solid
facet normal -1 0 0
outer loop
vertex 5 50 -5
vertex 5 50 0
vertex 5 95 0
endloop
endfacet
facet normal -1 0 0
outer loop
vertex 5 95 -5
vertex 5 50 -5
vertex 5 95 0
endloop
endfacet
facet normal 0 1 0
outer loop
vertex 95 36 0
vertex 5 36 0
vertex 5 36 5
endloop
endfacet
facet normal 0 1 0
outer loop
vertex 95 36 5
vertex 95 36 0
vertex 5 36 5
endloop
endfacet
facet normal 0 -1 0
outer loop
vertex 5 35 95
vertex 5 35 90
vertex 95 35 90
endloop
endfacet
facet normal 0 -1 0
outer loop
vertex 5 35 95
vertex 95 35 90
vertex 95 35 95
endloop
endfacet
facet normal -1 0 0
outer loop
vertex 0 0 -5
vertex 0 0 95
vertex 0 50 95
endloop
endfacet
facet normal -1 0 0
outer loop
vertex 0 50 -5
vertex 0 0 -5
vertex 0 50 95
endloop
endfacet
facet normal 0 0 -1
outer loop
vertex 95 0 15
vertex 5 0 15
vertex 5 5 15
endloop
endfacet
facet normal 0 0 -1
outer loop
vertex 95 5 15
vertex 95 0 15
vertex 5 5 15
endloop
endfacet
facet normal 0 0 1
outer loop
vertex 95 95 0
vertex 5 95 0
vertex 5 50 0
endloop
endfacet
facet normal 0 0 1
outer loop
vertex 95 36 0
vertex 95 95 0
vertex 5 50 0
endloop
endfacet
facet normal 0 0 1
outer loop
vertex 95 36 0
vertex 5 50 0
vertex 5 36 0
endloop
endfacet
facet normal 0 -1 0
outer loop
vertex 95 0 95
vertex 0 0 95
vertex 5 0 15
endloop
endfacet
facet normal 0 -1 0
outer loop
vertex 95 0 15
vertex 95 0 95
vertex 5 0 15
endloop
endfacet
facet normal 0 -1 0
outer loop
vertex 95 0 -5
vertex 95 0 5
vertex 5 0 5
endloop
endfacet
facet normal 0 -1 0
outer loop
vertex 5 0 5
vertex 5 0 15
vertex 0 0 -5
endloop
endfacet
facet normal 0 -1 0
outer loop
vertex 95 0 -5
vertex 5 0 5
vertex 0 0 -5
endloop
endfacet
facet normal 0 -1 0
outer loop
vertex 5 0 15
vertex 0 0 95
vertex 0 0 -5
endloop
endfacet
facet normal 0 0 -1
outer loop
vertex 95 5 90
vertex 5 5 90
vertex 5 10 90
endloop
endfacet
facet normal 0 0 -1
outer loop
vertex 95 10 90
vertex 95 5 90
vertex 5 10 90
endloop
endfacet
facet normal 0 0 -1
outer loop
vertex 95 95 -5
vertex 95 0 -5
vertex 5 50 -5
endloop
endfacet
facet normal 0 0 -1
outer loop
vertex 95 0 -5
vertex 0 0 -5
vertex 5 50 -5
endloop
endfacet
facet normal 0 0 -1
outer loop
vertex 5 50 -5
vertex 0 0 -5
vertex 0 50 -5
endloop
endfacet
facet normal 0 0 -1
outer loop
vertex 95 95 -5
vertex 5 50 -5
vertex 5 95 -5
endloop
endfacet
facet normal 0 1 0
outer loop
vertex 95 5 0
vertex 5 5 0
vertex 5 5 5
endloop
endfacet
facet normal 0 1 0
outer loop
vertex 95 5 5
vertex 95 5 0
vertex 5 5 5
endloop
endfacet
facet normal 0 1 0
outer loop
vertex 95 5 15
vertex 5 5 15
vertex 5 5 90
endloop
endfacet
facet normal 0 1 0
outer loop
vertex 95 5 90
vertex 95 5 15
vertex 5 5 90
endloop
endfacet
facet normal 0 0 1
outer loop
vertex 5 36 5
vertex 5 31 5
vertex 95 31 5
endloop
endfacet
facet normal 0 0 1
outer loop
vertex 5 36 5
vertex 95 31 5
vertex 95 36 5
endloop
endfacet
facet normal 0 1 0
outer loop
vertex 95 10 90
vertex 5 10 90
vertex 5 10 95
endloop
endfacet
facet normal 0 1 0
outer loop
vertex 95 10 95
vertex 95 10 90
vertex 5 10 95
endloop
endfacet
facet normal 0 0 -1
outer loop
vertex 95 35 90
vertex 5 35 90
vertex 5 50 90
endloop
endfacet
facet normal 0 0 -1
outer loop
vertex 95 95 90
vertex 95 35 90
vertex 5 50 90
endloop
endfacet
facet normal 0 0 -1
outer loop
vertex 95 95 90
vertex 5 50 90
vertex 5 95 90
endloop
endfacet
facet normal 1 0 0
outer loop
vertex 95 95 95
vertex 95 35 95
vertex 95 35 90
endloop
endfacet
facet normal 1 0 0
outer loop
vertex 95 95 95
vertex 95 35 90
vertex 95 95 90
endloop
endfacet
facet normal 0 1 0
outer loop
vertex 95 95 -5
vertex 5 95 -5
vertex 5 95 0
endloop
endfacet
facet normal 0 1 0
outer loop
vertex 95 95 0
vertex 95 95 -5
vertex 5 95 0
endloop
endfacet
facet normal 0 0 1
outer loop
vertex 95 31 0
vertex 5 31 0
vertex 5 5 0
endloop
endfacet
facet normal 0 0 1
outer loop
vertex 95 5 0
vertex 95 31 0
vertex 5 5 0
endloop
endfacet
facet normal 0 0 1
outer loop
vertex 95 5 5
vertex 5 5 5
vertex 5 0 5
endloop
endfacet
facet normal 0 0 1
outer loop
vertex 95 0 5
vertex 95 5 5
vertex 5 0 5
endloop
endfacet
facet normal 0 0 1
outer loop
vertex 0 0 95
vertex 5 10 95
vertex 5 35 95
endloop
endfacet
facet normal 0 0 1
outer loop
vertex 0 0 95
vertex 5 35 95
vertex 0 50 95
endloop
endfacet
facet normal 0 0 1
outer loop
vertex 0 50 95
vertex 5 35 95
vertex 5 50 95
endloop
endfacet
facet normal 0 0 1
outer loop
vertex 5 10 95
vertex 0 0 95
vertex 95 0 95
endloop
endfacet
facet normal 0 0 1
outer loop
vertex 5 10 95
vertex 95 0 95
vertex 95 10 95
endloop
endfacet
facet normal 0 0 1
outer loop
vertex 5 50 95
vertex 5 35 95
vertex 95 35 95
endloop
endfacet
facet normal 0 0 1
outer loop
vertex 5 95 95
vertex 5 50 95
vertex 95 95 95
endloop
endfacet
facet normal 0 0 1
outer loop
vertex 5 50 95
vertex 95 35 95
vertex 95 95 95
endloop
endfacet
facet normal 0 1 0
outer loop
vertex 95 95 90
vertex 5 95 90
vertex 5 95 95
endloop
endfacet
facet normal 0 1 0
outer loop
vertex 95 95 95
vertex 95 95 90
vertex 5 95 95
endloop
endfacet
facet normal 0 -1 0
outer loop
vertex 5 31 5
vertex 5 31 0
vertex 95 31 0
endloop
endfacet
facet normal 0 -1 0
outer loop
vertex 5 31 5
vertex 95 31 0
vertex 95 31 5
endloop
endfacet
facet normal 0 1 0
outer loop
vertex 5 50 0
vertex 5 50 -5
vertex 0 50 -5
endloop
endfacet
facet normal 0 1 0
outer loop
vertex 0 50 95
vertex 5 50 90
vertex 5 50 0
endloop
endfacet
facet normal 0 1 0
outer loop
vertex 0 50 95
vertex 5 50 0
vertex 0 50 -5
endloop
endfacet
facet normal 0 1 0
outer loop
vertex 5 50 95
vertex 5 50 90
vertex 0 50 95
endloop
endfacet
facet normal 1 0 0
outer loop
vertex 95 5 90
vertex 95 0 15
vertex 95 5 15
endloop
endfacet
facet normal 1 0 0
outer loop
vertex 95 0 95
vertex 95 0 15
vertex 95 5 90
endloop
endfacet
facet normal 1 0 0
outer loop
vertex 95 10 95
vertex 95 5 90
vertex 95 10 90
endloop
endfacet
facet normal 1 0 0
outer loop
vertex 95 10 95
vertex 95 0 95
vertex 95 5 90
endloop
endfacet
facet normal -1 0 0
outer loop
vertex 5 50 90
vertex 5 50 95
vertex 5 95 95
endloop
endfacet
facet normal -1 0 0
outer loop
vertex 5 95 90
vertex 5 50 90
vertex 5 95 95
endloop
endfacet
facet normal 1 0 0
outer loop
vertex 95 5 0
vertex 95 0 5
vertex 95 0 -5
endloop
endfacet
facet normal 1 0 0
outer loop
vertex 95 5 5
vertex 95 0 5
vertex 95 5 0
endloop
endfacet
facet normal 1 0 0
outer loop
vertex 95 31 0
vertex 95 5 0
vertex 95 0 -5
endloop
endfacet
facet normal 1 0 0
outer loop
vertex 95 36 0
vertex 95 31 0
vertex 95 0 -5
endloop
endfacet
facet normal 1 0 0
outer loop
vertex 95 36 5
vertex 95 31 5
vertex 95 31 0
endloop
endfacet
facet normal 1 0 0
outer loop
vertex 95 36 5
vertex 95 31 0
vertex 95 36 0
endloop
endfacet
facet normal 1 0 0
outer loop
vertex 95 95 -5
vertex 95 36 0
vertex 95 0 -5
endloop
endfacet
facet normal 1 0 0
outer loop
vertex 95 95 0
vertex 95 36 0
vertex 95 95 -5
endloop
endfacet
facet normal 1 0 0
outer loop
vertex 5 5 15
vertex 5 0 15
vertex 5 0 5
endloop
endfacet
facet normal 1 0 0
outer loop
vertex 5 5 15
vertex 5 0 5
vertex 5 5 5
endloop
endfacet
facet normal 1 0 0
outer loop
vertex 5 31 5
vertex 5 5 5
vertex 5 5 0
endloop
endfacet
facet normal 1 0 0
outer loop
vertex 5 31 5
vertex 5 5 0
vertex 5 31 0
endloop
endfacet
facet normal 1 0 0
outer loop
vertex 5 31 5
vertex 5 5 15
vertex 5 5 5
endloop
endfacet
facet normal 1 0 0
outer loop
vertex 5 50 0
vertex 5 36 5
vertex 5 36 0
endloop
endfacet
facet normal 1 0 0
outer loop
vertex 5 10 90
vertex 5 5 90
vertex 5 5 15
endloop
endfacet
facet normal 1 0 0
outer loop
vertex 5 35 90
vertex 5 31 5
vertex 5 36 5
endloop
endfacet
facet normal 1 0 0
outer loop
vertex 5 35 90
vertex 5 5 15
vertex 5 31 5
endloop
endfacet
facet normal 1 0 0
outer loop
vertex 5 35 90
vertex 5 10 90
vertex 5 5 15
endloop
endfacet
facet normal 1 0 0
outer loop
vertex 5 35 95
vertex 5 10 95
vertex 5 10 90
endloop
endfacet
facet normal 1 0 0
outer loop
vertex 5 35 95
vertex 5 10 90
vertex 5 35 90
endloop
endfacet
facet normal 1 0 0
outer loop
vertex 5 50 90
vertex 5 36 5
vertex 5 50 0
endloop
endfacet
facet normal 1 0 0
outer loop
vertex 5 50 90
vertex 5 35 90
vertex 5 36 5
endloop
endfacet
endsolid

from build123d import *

# Parameters (mm, degrees)
F3_W     = 50
F3_H     = 100
F4_DEPTH = 5
F0_W     = 5
F0_H     = 5
F2_W     = 60
F2_H     = 5
F5_DEPTH = 90
F6_ANGLE = 90
F7_ANGLE = 90


with BuildPart() as f4:
    # F3 (on Top) → F4 (new body)
    with BuildSketch(Plane.XY):
        with Locations((25, 50)):
            Rectangle(F3_W, F3_H)
    extrude(amount=-F4_DEPTH)

    # F0 (on Top) + F1 (on Top) + F2 (on Top) → F5 (join)
    with BuildSketch(Plane.XY):
        Polygon((0, 10), (0, 0), (95, 0), (95, 5), (36, 5), (31, 5), (5, 5), (5, 10), align=None)
        with Locations((33.5, 7.5)):
            Rectangle(F0_W, F0_H)
    with BuildSketch(Plane.XY):
        Polygon((0, 100), (0, 20), (5, 20), (5, 95), (10, 95), (10, 100), align=None)
    with BuildSketch(Plane.XY):
        with Locations((65, 97.5)):
            Rectangle(F2_W, F2_H)
    extrude(amount=F5_DEPTH)


with BuildPart() as f4_1:
    # F6: moved
    add(f4.part.rotate(Axis((25, 0, -5), (1, 0, 0)), F6_ANGLE))


with BuildPart() as f4_2:
    # F7: moved
    add(f4_1.part.rotate(Axis((0, 0, 45), (0, 0, 1)), F7_ANGLE))


solid = f4_2.part
